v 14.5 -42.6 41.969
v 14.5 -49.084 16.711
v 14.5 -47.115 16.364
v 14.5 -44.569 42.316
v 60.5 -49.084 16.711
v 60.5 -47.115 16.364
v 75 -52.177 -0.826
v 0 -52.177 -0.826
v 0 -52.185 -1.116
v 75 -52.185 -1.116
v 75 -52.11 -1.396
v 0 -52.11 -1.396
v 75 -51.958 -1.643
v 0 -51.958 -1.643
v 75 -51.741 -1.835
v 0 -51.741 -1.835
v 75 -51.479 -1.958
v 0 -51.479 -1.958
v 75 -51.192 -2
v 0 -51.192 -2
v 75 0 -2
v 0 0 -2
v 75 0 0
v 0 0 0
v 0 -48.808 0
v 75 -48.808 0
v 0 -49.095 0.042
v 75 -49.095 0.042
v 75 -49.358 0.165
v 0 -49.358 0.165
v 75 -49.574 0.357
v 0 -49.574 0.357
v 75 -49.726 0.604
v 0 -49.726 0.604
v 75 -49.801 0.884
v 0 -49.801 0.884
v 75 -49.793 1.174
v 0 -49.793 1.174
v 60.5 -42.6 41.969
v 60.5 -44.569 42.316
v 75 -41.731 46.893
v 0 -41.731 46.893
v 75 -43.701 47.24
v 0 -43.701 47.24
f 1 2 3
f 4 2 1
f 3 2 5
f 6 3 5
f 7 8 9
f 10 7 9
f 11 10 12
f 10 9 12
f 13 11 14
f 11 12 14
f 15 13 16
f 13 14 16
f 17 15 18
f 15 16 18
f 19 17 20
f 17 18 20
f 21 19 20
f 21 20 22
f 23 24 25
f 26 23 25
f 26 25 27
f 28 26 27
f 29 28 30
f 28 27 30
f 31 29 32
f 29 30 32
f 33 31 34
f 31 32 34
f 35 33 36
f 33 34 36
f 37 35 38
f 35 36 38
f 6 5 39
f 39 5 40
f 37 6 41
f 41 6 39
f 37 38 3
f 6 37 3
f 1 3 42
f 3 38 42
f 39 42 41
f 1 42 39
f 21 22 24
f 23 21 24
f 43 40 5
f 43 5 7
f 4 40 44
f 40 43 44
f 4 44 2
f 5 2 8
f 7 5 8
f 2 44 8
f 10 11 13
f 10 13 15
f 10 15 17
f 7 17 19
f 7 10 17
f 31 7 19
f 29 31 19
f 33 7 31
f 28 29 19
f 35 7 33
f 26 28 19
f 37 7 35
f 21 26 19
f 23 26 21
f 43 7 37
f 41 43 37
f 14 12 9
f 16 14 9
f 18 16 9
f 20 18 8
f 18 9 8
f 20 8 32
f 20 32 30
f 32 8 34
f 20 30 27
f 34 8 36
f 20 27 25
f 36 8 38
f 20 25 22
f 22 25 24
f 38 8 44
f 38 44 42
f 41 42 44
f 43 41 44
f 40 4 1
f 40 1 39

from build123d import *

# Parameters (mm, degrees)
F1_DEPTH = 75
F2_W     = 46
F2_H     = 26
F3_DEPTH = 2


with BuildPart() as f1:
    # F0 (on Right) → F1 (new body)
    with BuildSketch(Plane.YZ):
        with BuildLine():
            Line((0, -2), (0, 0))
            Line((0, 0), (-48.8082464074, 0))
            ThreePointArc((-48.8082464074, 0), (-49.5742908505, 0.3572123903), (-49.7930541604, 1.1736481777))
            Line((-49.7930541604, 1.1736481777), (-41.7314827958, 46.8930912953))
            Line((-41.7314827958, 46.8930912953), (-43.7010983018, 47.2403876506))
            Line((-43.7010983018, 47.2403876506), (-52.1765613456, -0.8263518223))
            ThreePointArc((-52.1765613456, -0.8263518223), (-51.9577980357, -1.6427876097), (-51.1917535926, -2))
            Line((-51.1917535926, -2), (0, -2))
        make_face()
    extrude(amount=F1_DEPTH)

    # F2 (on face) → F3 (cut, through all)
    with BuildSketch(Plane(origin=(0, -50.4619310257, 8.8977999385), x_dir=(1, 0, 0), z_dir=(0, -0.984807753, 0.1736481777))):
        with Locations((37.5, 20.9340839315)):
            Rectangle(F2_W, F2_H)
    extrude(amount=-F3_DEPTH, mode=Mode.SUBTRACT)


solid = f1.part
